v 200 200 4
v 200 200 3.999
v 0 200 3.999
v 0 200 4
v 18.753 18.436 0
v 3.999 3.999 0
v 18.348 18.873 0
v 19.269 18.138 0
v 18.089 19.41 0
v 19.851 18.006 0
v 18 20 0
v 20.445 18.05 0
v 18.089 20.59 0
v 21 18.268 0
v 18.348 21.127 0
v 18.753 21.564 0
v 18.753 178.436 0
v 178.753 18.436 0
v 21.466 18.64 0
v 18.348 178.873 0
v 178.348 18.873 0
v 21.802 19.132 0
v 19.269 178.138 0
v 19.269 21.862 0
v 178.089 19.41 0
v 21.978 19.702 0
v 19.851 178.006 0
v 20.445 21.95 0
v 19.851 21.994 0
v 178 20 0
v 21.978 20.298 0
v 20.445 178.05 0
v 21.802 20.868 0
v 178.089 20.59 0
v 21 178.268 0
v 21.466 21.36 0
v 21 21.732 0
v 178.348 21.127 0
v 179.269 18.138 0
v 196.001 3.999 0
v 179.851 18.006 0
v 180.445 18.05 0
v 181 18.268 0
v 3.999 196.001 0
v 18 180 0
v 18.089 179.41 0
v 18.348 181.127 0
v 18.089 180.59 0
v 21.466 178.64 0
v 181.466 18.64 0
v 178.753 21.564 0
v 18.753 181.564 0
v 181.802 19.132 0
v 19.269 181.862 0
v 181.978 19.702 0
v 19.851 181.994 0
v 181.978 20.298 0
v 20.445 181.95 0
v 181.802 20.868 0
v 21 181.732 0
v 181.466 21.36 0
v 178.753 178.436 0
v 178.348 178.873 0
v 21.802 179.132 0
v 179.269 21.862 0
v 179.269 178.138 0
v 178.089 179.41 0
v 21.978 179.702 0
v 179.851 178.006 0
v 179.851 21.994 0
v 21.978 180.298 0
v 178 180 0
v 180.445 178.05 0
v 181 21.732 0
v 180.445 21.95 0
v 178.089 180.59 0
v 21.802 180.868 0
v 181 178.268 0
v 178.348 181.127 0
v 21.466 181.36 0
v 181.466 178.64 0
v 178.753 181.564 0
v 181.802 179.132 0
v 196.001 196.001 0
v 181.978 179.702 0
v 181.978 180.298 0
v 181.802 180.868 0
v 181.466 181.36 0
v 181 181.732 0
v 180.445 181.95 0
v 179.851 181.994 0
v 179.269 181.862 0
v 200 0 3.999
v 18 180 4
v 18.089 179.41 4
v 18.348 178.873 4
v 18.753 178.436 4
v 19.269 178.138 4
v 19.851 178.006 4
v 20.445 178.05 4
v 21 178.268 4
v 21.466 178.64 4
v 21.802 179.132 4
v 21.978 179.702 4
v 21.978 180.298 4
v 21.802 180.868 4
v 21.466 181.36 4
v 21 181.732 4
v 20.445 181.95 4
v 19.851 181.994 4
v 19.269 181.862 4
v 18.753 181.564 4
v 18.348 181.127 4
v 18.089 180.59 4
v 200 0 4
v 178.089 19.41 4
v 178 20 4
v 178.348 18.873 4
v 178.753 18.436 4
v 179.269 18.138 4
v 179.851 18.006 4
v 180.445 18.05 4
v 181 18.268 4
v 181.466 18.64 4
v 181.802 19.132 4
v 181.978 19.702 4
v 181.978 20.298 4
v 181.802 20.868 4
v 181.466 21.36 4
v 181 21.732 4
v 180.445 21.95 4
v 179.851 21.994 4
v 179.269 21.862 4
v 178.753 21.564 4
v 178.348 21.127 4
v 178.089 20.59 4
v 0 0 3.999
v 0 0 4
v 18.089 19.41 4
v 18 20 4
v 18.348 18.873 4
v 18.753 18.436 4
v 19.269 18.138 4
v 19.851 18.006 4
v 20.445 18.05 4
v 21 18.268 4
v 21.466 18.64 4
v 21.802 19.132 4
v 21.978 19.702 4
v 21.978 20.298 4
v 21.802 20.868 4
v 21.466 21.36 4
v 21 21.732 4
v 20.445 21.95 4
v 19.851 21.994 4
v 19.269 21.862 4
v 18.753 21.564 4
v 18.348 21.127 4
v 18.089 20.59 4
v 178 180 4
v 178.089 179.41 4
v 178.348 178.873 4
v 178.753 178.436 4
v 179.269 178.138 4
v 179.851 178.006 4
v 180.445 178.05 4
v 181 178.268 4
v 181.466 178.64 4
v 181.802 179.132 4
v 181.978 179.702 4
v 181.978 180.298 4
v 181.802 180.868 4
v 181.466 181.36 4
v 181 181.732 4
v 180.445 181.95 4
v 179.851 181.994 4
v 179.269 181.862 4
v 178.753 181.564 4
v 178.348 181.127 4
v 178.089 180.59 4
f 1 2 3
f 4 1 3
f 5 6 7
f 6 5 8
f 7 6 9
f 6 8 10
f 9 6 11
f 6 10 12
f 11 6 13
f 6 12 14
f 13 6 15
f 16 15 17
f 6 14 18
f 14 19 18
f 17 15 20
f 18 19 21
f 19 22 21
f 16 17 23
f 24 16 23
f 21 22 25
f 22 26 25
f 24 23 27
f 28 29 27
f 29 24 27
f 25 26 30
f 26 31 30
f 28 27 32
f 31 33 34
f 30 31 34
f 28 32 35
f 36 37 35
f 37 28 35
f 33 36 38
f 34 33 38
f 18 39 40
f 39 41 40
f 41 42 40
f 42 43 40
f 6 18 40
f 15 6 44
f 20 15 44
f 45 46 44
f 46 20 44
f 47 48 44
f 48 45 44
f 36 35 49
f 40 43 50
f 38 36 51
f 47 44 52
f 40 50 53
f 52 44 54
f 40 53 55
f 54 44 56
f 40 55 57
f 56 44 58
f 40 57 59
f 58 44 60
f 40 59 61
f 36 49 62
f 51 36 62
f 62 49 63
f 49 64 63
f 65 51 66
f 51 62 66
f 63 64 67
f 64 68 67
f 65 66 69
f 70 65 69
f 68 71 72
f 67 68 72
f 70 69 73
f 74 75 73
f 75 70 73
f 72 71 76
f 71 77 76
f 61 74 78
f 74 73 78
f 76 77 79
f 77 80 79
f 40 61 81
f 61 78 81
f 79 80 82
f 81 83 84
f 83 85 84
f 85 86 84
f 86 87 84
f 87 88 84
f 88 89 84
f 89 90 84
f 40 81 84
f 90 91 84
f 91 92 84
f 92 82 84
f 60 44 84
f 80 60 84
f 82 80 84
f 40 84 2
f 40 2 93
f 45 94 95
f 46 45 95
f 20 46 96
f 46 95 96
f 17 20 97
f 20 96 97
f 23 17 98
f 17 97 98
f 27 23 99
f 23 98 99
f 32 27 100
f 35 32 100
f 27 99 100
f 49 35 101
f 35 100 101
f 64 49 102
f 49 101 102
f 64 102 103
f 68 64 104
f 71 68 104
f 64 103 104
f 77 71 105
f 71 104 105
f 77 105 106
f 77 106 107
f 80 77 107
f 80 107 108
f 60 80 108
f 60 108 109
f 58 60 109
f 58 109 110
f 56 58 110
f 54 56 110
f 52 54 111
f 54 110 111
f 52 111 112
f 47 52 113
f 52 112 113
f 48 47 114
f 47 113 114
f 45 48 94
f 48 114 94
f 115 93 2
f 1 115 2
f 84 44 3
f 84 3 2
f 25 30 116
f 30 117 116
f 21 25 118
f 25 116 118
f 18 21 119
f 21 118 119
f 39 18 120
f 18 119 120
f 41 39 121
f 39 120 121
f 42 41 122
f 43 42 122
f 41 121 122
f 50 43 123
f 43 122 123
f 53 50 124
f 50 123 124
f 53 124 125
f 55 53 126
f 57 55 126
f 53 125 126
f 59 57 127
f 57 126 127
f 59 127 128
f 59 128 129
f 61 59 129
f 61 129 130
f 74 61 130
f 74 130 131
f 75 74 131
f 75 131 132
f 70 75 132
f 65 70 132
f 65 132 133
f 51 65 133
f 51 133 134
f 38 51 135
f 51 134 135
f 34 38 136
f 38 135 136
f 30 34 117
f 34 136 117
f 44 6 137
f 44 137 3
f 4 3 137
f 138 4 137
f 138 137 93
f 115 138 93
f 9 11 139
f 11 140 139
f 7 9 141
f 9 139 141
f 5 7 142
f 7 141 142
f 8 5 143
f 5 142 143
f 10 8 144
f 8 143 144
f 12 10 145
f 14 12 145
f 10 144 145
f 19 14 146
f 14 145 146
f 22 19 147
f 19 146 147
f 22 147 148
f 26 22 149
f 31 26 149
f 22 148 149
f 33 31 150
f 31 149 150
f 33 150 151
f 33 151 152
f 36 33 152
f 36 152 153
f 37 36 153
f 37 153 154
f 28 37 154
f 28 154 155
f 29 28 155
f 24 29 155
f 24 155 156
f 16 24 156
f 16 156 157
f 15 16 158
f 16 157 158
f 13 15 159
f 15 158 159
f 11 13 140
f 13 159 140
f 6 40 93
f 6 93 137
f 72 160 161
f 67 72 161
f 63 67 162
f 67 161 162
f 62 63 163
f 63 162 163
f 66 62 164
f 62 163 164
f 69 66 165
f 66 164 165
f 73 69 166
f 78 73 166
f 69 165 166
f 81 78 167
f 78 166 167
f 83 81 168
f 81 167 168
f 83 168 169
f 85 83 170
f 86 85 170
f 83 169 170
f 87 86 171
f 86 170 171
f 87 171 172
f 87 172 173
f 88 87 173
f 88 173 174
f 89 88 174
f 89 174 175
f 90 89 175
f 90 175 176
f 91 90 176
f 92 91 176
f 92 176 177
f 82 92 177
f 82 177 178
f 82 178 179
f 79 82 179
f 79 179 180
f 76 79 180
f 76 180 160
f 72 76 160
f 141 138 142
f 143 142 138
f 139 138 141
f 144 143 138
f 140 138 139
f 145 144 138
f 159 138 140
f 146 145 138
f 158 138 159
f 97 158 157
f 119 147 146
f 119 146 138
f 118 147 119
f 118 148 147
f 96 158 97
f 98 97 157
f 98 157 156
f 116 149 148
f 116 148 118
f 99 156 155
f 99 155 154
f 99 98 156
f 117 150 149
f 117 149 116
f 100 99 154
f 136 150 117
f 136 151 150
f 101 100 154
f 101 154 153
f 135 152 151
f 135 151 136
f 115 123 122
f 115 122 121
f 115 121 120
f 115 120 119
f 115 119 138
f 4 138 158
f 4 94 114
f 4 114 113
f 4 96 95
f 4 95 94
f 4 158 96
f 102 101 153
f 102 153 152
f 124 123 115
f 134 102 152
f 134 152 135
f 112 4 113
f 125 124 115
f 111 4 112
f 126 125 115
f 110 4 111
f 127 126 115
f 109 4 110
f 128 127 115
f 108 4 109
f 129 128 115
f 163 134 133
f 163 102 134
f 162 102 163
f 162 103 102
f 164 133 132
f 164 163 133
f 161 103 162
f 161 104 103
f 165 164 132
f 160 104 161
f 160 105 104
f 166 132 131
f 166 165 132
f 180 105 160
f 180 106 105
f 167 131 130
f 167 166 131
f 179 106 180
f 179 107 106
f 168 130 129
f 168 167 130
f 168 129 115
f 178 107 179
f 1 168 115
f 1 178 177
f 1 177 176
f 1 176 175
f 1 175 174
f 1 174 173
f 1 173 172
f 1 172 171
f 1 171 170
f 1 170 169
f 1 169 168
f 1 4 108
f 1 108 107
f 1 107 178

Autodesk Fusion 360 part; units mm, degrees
sketch "Esquisse1" plane through (0, 0, 0) normal (0, 0, 1) x (1, 0, 0)
  line L0 (0, 0) -> (200, 0)
  line L1 (200, 0) -> (200, 200)
  line L2 (200, 200) -> (0, 200)
  line L3 (0, 200) -> (0, 0)
  dimension "d18" = 200
  dimension "d19" = 200
extrude "Extrusion1" add sketch "Esquisse1" along normal blind 4
chamfer "Chanfrein1" distance 4 angle 45 1 faces at (66.6667, 133.3333, 0)
sketch "Esquisse2" plane through (0, 0, 4) normal (0, 0, 1) x (-1, 0, 0)
  circle A0 centre (-20, -180) radius 2
  circle A1 centre (-180, -180) radius 2
  circle A2 centre (-180, -20) radius 2
  circle A3 centre (-20, -20) radius 2
  line L0 (0, 0) -> (-20, -20)
  line L1 (-200, 0) -> (-180, -20)
  line L2 (0, -200) -> (-20, -180)
  line L3 (-200, -200) -> (-180, -180)
  line L4 (0, -200) -> (0, 0)
  line L5 (0, 0) -> (-200, 0)
  line L6 (-200, 0) -> (-200, -200)
  line L7 (-200, -200) -> (0, -200)
  dimension "d10" = 4
  dimension "d11" = 4
  dimension "d12" = 4
  dimension "d13" = 4
  dimension "d20" = 28.2843
  dimension "d23" = 28.2843
  dimension "d24" = 28.2843
  dimension "d25" = 28.2843
extrude "Extrusion2" cut sketch "Esquisse2" against normal blind 14 contours A0 | A1 | A2 | A3
thread "Filetage1" "ISO Metric profile 4.0 M4x0.7 M4x0.7 6H" major diameter 4.1095 minor diameter 3.332 pitch 0.7 angle 60 resizes the face on face at (21.9603, 179.6037, 1.3333)
thread "Filetage2" "ISO Metric profile 4.0 M4x0.7 M4x0.7 6H" major diameter 4.1095 minor diameter 3.332 pitch 0.7 angle 60 resizes the face on face at (18.0099, 20.1991, 1.3333)
thread "Filetage3" "ISO Metric profile 4.0 M4x0.7 M4x0.7 6H" major diameter 4.1095 minor diameter 3.332 pitch 0.7 angle 60 resizes the face on face at (180.9124, 21.7797, 2.6667)
thread "Filetage4" "ISO Metric profile 4.0 M4x0.7 M4x0.7 6H" major diameter 4.1095 minor diameter 3.332 pitch 0.7 angle 60 resizes the face on face at (181.9603, 179.6037, 1.3333)
equation "d20 = ( sqrt(800) ) * 1 mm"
equation "d23 = ( sqrt(800) ) * 1 mm"
equation "d24 = ( sqrt(800) ) * 1 mm"
equation "d25 = ( sqrt(800) ) * 1 mm"
